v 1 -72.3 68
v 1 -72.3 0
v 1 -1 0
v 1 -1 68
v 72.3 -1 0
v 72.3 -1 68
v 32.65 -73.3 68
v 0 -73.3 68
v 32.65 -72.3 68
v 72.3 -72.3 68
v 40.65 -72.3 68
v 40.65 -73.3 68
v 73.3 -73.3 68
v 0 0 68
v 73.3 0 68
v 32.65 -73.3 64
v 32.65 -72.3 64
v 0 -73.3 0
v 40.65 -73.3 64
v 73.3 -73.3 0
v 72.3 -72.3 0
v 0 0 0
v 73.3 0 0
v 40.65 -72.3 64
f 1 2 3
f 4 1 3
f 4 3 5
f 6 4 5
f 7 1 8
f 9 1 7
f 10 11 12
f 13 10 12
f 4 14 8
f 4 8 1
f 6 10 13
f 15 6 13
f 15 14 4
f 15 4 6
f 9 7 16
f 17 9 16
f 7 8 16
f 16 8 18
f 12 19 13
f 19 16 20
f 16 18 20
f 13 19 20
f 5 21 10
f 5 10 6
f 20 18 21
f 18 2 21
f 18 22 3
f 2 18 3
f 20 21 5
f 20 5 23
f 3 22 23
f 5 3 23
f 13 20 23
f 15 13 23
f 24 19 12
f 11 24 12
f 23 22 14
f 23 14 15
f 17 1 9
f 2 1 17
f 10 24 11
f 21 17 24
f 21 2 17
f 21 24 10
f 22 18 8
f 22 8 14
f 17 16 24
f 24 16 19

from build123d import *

# Parameters (mm, degrees)
F0_W     = 73.3
F0_H     = 73.3
F0_W_2   = 71.3
F0_H_2   = 71.3
F1_DEPTH = 68
F3_DEPTH = 5


with BuildPart() as f1:
    # F0 (on Top) → F1 (new body)
    with BuildSketch(Plane.XY):
        with Locations((36.65, -36.65)):
            Rectangle(F0_W, F0_H)
        with Locations((36.65, -36.65)):
            Rectangle(F0_W_2, F0_H_2, mode=Mode.SUBTRACT)
    extrude(amount=F1_DEPTH)

    # F2 (on face) → F3 (cut)
    with BuildSketch(Plane.XZ.offset(73.3)):
        Polygon((32.65, 64), (36.65, 64), (40.65, 64), (40.65, 68), (32.65, 68), align=None)
    extrude(amount=-F3_DEPTH, mode=Mode.SUBTRACT)


solid = f1.part
